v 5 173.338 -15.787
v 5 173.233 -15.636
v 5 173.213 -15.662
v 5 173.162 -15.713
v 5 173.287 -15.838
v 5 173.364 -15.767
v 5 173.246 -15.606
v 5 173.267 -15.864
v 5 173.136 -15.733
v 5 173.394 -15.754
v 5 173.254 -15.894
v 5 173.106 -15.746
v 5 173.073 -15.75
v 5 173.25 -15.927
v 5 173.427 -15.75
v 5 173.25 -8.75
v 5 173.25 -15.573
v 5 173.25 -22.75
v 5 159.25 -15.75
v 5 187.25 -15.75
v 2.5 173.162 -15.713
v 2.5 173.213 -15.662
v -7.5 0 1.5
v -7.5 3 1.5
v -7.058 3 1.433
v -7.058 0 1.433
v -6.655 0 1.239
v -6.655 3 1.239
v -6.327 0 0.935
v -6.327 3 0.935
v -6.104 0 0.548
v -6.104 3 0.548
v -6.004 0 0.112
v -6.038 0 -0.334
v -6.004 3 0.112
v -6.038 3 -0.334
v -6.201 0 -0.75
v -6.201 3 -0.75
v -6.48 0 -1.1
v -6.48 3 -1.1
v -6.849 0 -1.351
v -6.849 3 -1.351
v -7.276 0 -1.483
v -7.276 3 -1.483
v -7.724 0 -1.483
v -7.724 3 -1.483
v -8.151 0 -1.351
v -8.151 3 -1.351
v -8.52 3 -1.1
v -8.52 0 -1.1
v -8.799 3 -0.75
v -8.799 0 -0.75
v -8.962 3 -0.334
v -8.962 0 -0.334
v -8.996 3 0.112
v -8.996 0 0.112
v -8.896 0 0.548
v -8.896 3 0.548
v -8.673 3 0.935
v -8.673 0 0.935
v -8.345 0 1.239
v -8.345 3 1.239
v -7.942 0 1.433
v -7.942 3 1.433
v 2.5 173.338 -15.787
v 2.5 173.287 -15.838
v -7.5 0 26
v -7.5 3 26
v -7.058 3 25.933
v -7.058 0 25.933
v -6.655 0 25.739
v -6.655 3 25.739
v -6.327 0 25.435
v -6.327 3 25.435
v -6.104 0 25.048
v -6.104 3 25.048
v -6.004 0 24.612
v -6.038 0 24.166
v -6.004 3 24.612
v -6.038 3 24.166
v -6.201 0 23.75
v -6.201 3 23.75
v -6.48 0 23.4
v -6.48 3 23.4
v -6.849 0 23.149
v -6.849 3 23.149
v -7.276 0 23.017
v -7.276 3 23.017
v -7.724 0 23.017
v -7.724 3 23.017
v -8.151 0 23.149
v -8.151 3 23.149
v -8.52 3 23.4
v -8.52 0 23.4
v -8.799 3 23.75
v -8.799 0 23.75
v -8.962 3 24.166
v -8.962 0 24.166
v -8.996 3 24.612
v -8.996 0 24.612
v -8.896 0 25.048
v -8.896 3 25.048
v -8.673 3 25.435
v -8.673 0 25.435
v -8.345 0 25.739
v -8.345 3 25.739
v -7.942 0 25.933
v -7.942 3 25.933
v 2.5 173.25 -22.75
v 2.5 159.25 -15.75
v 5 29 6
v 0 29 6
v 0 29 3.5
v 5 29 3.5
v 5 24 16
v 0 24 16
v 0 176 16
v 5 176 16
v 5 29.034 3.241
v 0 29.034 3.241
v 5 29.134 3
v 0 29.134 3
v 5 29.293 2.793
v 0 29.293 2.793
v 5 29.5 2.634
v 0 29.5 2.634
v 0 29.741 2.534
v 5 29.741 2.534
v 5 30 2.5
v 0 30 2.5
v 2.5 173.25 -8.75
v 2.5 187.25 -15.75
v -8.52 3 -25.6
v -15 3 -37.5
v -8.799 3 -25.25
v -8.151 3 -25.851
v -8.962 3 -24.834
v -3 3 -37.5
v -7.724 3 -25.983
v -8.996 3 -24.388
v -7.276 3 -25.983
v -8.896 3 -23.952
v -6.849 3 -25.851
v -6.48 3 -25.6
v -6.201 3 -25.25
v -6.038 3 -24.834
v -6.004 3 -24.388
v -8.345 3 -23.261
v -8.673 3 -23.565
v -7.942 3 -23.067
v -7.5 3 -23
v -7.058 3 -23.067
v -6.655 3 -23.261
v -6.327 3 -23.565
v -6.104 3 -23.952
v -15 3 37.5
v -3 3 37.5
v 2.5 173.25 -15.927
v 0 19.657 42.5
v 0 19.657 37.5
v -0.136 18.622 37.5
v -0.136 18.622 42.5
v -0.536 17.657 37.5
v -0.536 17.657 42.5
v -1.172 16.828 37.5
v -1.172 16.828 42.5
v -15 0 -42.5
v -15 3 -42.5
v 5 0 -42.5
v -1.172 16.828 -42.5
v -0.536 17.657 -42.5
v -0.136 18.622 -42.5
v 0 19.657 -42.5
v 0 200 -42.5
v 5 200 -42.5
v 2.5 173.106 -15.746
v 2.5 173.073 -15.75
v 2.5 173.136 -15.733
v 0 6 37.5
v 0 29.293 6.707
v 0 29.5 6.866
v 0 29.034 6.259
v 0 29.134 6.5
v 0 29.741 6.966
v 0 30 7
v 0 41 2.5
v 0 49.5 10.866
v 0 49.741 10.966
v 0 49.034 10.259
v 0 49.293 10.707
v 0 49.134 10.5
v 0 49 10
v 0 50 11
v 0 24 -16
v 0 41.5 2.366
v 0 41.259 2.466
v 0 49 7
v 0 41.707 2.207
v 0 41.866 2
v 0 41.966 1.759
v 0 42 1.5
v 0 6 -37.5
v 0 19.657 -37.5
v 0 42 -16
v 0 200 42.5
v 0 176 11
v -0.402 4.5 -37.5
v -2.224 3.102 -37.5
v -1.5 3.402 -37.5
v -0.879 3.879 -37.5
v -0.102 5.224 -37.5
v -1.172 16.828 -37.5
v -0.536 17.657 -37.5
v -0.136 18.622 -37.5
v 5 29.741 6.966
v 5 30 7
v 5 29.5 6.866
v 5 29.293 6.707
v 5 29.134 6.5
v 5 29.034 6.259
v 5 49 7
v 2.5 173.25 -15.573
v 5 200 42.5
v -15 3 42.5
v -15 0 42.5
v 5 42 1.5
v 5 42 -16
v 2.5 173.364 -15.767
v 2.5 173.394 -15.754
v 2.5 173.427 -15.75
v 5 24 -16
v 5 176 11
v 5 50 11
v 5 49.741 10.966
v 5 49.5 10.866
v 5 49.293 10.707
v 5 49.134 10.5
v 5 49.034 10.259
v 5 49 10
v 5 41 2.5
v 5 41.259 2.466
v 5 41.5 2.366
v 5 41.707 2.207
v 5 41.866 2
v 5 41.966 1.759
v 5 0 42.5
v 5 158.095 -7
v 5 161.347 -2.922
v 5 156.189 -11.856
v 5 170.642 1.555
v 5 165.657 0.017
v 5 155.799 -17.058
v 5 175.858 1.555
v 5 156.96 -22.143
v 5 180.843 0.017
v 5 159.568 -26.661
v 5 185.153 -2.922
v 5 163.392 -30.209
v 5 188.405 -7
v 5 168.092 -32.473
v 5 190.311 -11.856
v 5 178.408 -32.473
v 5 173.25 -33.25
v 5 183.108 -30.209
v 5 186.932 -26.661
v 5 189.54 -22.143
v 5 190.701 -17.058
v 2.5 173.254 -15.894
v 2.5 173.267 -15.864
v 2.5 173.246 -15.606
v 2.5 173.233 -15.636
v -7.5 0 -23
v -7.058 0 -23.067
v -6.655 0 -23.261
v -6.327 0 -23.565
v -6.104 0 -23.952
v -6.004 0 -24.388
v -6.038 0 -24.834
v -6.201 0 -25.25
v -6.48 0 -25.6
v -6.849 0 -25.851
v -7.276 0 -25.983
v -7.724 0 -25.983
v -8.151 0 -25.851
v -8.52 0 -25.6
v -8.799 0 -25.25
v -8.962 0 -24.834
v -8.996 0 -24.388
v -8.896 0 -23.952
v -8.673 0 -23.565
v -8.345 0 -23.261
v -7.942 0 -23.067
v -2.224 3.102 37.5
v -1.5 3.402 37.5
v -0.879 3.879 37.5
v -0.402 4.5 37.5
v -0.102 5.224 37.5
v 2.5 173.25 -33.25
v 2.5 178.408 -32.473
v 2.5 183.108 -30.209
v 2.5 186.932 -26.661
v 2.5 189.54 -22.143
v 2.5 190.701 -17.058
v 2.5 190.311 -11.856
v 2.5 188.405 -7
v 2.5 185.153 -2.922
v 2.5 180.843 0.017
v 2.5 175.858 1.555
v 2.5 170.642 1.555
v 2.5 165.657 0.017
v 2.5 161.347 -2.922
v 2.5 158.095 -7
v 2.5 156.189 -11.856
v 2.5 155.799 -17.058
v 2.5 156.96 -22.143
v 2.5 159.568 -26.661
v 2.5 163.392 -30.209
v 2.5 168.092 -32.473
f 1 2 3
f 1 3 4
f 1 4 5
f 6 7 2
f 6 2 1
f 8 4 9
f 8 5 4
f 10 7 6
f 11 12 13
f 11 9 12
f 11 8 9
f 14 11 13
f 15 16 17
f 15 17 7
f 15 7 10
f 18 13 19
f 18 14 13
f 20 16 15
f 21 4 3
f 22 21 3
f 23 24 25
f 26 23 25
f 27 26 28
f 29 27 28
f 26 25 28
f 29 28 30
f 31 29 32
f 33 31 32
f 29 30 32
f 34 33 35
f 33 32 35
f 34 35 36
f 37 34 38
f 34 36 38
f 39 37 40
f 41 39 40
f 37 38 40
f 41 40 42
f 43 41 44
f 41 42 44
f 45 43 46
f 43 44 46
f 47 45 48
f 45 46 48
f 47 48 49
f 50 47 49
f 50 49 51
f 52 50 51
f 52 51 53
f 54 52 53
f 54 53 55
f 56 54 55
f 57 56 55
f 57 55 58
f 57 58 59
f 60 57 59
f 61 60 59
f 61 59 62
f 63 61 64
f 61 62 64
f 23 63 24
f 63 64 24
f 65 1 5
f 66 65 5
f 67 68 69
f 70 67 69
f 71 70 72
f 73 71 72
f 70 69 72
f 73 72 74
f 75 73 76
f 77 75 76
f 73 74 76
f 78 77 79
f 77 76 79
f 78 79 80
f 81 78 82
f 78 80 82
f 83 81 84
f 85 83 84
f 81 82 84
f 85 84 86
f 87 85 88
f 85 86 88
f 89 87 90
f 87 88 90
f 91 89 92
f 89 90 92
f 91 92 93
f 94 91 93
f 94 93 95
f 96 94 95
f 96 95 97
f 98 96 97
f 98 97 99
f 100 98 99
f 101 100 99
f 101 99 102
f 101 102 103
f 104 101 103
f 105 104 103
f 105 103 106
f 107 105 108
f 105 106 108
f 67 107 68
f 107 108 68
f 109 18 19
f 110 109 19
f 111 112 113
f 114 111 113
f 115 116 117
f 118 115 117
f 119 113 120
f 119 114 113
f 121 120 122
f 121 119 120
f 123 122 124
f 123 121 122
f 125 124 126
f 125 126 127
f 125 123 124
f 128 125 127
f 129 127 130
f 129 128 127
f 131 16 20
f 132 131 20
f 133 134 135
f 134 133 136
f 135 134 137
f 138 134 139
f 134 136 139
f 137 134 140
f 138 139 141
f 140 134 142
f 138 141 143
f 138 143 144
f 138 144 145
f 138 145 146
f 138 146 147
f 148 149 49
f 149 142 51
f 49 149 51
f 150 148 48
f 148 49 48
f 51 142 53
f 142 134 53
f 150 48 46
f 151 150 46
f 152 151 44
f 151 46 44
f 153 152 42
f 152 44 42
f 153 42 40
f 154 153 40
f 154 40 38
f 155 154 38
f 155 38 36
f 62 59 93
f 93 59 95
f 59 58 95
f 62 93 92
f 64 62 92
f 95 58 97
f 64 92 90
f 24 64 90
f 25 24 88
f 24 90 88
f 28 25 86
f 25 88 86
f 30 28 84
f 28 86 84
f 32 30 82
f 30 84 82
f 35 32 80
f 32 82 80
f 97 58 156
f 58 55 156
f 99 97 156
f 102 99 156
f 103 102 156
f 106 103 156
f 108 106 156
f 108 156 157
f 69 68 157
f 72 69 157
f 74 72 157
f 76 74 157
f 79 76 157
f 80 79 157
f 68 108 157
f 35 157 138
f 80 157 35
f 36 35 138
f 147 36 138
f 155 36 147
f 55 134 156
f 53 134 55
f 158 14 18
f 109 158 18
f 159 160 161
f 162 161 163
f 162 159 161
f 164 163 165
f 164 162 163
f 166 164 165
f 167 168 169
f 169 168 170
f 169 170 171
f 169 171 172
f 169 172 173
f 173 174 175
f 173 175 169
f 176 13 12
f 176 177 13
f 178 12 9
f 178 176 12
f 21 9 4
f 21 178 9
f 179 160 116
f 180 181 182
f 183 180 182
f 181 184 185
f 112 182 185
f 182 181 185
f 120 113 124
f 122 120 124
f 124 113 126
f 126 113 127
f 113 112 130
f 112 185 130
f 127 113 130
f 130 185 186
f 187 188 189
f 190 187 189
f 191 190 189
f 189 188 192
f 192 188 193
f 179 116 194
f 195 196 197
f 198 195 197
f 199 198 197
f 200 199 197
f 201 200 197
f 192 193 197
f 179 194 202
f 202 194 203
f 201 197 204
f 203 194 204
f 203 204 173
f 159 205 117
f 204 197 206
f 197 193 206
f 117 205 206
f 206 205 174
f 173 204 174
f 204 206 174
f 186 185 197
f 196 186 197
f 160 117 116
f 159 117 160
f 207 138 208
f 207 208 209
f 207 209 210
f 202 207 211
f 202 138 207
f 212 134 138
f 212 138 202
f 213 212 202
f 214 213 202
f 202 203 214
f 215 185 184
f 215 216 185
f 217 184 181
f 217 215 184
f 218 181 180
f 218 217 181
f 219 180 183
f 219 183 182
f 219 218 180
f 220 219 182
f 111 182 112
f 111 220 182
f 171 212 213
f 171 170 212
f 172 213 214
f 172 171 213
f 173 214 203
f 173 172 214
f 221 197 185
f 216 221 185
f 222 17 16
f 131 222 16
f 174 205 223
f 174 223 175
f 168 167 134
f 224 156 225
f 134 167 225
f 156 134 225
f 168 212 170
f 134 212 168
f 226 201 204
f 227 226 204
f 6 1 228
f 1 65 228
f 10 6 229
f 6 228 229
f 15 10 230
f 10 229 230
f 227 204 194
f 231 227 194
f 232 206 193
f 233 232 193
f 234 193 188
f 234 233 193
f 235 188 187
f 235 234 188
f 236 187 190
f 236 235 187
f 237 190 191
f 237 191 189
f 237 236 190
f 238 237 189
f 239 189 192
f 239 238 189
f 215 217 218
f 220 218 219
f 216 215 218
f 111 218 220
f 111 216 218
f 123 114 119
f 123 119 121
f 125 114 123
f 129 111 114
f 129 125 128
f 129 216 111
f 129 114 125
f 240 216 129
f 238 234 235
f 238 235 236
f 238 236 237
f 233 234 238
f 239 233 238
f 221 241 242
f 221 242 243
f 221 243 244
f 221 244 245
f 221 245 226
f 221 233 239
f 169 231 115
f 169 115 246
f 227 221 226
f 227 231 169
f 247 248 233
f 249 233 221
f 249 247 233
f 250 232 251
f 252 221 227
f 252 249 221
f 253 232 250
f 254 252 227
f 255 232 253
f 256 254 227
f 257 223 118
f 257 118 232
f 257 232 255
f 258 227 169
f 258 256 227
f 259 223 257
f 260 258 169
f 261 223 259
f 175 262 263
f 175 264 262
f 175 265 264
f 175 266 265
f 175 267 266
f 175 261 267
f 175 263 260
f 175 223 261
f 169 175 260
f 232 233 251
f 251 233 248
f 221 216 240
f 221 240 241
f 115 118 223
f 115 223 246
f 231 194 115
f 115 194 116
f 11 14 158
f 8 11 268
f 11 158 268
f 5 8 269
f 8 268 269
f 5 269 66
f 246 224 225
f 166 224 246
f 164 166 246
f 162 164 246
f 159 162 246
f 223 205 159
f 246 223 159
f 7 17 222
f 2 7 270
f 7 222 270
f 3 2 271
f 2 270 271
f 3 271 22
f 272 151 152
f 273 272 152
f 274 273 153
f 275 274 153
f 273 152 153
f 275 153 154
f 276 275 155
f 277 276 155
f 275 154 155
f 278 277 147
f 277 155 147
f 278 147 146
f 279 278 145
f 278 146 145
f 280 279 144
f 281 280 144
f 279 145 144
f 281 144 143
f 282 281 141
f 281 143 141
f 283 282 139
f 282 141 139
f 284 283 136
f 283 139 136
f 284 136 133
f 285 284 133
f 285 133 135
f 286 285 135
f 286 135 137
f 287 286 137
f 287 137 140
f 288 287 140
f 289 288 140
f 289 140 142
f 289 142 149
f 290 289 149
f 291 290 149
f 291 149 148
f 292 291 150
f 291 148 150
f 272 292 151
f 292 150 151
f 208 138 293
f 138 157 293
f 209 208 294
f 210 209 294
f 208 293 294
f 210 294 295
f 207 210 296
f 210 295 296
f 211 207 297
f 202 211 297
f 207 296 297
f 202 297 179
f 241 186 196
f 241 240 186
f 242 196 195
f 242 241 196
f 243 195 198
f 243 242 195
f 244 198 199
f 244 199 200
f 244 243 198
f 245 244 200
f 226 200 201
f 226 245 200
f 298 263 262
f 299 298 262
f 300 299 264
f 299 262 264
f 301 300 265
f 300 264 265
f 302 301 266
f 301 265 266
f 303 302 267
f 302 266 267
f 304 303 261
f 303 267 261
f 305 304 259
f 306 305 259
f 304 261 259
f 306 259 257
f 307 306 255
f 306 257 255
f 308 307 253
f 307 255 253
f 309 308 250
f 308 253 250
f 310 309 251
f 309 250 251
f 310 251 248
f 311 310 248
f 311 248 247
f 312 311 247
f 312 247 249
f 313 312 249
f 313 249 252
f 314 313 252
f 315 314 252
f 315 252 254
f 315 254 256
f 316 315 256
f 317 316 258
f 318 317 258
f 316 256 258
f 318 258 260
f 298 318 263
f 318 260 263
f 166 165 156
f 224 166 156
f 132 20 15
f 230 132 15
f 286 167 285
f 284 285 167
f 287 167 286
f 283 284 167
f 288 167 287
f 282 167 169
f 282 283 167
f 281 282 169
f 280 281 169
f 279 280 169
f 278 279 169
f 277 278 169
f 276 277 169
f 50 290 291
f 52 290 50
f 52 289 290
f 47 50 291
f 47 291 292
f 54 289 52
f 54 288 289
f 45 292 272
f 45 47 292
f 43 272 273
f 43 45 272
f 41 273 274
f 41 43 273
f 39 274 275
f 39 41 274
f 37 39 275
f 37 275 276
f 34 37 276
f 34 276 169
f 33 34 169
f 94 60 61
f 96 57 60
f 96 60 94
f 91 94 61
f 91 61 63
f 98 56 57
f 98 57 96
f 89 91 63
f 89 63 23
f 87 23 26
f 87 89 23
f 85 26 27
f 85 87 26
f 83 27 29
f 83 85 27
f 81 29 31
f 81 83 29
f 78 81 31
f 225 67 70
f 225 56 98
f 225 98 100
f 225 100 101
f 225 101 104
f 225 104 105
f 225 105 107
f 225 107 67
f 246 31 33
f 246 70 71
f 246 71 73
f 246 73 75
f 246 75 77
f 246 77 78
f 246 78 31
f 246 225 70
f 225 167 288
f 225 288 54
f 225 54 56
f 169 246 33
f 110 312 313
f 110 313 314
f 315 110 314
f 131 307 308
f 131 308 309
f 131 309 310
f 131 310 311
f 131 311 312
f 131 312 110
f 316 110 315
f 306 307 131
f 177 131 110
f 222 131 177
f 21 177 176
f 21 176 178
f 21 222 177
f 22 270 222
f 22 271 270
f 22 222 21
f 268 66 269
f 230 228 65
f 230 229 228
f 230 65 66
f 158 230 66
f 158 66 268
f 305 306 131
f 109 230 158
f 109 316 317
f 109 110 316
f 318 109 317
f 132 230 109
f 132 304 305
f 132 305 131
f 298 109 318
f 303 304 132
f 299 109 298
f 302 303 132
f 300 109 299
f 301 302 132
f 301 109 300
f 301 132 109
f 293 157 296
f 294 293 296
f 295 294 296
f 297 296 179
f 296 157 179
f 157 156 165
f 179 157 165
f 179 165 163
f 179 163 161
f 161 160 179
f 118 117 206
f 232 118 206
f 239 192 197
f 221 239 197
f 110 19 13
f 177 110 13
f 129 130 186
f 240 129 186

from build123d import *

# Parameters (mm, degrees)
SKETCH1_W           = 85
SKETCH1_H           = 200
BOSS_EXTRUDE1_DEPTH = 5
FILLET1_R           = 1
SKETCH2_R           = 17.5
CUT_EXTRUDE1_DEPTH  = 2.5
FILLET2_R           = 0.125
SKETCH3_W           = 15
SKETCH3_H           = 85
BOSS_EXTRUDE2_DEPTH = 3
RIB1_START          = -5
RIB1_DEPTH          = 5
SKETCH5_R           = 1.5
CUT_EXTRUDE2_DEPTH  = 3
FILLET3_R           = 4
FILLET4_R           = 3


# Read off the part's stored shape, not the designer's step: Rib1
with BuildPart() as part:
    # Sketch1 → Boss-Extrude1 (new body)
    with BuildSketch(Plane(origin=(0, 0, 0), x_dir=(0, 0, -1), z_dir=(1, 0, 0))):
        with Locations((0, 100)):
            Rectangle(SKETCH1_W, SKETCH1_H)
        Polygon((-16, 25), (-16, 176), (-11, 176), (-11, 49), (-7, 49), (-7, 29), (-2.5, 29), (-2.5, 42), (16, 42), (16, 25), (16, 24), (15, 24), (-15, 24), (-16, 24), align=None, mode=Mode.SUBTRACT)
    extrude(amount=BOSS_EXTRUDE1_DEPTH)

    # Fillet1
    fillet1_edges = [part.edges().sort_by_distance(p)[0] for p in [
        (2.5, 42, 2.5),
        (2.5, 29, 2.5),
        (2.5, 29, 7),
        (2.5, 49, 11),
    ]]
    fillet(fillet1_edges, radius=FILLET1_R)

    # Sketch2 → Cut-Extrude1 (cut)
    with BuildSketch(Plane(origin=(5, 0, 0), x_dir=(0, 0, -1), z_dir=(1, 0, 0))):
        with Locations((15.75, 173.25)):
            Circle(SKETCH2_R)
        Polygon((15.75, 173.125), (15.625, 173.25), (8.75, 173.25), (15.75, 187.25), (15.75, 173.375), (15.875, 173.25), (22.75, 173.25), (15.75, 159.25), align=None, mode=Mode.SUBTRACT)
    extrude(amount=-CUT_EXTRUDE1_DEPTH, mode=Mode.SUBTRACT)

    # Fillet2
    fillet2_edges = [part.edges().sort_by_distance(p)[0] for p in [
        (3.75, 173.25, -15.625),
        (3.75, 173.125, -15.75),
        (3.75, 173.25, -15.875),
        (3.75, 173.375, -15.75),
    ]]
    fillet(fillet2_edges, radius=FILLET2_R)

    # Sketch3 → Boss-Extrude2 (add)
    with BuildSketch(Plane.XZ):
        with Locations((-7.5, 0)):
            Rectangle(SKETCH3_W, SKETCH3_H)
    extrude(amount=-BOSS_EXTRUDE2_DEPTH)

    # Rib1 outline → Rib1 (add)
    with BuildSketch(Plane.XY.offset(42.5).offset(RIB1_START)):
        Polygon((0, 18), (-15, 3), (0, 3), align=None)
    rib1 = extrude(amount=RIB1_DEPTH)

    # Mirror1: Rib1 across plane
    add(rib1.mirror(Plane.XY))

    # Sketch5 → Cut-Extrude2 (cut)
    with BuildSketch(Plane(origin=(0, 3, 0), x_dir=(1, 0, 0), z_dir=(0, 1, 0))):
        with Locations(Location((-7.5, 24.5, 0), (0, 0, 270))):
            Circle(SKETCH5_R)
        with Locations(Location((-7.5, 0, 0), (0, 0, 270))):
            Circle(SKETCH5_R)
        with Locations(Location((-7.5, -24.5, 0), (0, 0, 270))):
            Circle(SKETCH5_R)
    extrude(amount=-CUT_EXTRUDE2_DEPTH, mode=Mode.SUBTRACT)

    # Fillet3
    fillet3_edges = [part.edges().sort_by_distance(p)[0] for p in [
        (0, 18, 40),
        (0, 18, -40),
    ]]
    fillet(fillet3_edges, radius=FILLET3_R)

    # Fillet4
    fillet4_edges = [part.edges().sort_by_distance(p)[0] for p in [
        (0, 3, 0),
    ]]
    fillet(fillet4_edges, radius=FILLET4_R)


solid = part.part
